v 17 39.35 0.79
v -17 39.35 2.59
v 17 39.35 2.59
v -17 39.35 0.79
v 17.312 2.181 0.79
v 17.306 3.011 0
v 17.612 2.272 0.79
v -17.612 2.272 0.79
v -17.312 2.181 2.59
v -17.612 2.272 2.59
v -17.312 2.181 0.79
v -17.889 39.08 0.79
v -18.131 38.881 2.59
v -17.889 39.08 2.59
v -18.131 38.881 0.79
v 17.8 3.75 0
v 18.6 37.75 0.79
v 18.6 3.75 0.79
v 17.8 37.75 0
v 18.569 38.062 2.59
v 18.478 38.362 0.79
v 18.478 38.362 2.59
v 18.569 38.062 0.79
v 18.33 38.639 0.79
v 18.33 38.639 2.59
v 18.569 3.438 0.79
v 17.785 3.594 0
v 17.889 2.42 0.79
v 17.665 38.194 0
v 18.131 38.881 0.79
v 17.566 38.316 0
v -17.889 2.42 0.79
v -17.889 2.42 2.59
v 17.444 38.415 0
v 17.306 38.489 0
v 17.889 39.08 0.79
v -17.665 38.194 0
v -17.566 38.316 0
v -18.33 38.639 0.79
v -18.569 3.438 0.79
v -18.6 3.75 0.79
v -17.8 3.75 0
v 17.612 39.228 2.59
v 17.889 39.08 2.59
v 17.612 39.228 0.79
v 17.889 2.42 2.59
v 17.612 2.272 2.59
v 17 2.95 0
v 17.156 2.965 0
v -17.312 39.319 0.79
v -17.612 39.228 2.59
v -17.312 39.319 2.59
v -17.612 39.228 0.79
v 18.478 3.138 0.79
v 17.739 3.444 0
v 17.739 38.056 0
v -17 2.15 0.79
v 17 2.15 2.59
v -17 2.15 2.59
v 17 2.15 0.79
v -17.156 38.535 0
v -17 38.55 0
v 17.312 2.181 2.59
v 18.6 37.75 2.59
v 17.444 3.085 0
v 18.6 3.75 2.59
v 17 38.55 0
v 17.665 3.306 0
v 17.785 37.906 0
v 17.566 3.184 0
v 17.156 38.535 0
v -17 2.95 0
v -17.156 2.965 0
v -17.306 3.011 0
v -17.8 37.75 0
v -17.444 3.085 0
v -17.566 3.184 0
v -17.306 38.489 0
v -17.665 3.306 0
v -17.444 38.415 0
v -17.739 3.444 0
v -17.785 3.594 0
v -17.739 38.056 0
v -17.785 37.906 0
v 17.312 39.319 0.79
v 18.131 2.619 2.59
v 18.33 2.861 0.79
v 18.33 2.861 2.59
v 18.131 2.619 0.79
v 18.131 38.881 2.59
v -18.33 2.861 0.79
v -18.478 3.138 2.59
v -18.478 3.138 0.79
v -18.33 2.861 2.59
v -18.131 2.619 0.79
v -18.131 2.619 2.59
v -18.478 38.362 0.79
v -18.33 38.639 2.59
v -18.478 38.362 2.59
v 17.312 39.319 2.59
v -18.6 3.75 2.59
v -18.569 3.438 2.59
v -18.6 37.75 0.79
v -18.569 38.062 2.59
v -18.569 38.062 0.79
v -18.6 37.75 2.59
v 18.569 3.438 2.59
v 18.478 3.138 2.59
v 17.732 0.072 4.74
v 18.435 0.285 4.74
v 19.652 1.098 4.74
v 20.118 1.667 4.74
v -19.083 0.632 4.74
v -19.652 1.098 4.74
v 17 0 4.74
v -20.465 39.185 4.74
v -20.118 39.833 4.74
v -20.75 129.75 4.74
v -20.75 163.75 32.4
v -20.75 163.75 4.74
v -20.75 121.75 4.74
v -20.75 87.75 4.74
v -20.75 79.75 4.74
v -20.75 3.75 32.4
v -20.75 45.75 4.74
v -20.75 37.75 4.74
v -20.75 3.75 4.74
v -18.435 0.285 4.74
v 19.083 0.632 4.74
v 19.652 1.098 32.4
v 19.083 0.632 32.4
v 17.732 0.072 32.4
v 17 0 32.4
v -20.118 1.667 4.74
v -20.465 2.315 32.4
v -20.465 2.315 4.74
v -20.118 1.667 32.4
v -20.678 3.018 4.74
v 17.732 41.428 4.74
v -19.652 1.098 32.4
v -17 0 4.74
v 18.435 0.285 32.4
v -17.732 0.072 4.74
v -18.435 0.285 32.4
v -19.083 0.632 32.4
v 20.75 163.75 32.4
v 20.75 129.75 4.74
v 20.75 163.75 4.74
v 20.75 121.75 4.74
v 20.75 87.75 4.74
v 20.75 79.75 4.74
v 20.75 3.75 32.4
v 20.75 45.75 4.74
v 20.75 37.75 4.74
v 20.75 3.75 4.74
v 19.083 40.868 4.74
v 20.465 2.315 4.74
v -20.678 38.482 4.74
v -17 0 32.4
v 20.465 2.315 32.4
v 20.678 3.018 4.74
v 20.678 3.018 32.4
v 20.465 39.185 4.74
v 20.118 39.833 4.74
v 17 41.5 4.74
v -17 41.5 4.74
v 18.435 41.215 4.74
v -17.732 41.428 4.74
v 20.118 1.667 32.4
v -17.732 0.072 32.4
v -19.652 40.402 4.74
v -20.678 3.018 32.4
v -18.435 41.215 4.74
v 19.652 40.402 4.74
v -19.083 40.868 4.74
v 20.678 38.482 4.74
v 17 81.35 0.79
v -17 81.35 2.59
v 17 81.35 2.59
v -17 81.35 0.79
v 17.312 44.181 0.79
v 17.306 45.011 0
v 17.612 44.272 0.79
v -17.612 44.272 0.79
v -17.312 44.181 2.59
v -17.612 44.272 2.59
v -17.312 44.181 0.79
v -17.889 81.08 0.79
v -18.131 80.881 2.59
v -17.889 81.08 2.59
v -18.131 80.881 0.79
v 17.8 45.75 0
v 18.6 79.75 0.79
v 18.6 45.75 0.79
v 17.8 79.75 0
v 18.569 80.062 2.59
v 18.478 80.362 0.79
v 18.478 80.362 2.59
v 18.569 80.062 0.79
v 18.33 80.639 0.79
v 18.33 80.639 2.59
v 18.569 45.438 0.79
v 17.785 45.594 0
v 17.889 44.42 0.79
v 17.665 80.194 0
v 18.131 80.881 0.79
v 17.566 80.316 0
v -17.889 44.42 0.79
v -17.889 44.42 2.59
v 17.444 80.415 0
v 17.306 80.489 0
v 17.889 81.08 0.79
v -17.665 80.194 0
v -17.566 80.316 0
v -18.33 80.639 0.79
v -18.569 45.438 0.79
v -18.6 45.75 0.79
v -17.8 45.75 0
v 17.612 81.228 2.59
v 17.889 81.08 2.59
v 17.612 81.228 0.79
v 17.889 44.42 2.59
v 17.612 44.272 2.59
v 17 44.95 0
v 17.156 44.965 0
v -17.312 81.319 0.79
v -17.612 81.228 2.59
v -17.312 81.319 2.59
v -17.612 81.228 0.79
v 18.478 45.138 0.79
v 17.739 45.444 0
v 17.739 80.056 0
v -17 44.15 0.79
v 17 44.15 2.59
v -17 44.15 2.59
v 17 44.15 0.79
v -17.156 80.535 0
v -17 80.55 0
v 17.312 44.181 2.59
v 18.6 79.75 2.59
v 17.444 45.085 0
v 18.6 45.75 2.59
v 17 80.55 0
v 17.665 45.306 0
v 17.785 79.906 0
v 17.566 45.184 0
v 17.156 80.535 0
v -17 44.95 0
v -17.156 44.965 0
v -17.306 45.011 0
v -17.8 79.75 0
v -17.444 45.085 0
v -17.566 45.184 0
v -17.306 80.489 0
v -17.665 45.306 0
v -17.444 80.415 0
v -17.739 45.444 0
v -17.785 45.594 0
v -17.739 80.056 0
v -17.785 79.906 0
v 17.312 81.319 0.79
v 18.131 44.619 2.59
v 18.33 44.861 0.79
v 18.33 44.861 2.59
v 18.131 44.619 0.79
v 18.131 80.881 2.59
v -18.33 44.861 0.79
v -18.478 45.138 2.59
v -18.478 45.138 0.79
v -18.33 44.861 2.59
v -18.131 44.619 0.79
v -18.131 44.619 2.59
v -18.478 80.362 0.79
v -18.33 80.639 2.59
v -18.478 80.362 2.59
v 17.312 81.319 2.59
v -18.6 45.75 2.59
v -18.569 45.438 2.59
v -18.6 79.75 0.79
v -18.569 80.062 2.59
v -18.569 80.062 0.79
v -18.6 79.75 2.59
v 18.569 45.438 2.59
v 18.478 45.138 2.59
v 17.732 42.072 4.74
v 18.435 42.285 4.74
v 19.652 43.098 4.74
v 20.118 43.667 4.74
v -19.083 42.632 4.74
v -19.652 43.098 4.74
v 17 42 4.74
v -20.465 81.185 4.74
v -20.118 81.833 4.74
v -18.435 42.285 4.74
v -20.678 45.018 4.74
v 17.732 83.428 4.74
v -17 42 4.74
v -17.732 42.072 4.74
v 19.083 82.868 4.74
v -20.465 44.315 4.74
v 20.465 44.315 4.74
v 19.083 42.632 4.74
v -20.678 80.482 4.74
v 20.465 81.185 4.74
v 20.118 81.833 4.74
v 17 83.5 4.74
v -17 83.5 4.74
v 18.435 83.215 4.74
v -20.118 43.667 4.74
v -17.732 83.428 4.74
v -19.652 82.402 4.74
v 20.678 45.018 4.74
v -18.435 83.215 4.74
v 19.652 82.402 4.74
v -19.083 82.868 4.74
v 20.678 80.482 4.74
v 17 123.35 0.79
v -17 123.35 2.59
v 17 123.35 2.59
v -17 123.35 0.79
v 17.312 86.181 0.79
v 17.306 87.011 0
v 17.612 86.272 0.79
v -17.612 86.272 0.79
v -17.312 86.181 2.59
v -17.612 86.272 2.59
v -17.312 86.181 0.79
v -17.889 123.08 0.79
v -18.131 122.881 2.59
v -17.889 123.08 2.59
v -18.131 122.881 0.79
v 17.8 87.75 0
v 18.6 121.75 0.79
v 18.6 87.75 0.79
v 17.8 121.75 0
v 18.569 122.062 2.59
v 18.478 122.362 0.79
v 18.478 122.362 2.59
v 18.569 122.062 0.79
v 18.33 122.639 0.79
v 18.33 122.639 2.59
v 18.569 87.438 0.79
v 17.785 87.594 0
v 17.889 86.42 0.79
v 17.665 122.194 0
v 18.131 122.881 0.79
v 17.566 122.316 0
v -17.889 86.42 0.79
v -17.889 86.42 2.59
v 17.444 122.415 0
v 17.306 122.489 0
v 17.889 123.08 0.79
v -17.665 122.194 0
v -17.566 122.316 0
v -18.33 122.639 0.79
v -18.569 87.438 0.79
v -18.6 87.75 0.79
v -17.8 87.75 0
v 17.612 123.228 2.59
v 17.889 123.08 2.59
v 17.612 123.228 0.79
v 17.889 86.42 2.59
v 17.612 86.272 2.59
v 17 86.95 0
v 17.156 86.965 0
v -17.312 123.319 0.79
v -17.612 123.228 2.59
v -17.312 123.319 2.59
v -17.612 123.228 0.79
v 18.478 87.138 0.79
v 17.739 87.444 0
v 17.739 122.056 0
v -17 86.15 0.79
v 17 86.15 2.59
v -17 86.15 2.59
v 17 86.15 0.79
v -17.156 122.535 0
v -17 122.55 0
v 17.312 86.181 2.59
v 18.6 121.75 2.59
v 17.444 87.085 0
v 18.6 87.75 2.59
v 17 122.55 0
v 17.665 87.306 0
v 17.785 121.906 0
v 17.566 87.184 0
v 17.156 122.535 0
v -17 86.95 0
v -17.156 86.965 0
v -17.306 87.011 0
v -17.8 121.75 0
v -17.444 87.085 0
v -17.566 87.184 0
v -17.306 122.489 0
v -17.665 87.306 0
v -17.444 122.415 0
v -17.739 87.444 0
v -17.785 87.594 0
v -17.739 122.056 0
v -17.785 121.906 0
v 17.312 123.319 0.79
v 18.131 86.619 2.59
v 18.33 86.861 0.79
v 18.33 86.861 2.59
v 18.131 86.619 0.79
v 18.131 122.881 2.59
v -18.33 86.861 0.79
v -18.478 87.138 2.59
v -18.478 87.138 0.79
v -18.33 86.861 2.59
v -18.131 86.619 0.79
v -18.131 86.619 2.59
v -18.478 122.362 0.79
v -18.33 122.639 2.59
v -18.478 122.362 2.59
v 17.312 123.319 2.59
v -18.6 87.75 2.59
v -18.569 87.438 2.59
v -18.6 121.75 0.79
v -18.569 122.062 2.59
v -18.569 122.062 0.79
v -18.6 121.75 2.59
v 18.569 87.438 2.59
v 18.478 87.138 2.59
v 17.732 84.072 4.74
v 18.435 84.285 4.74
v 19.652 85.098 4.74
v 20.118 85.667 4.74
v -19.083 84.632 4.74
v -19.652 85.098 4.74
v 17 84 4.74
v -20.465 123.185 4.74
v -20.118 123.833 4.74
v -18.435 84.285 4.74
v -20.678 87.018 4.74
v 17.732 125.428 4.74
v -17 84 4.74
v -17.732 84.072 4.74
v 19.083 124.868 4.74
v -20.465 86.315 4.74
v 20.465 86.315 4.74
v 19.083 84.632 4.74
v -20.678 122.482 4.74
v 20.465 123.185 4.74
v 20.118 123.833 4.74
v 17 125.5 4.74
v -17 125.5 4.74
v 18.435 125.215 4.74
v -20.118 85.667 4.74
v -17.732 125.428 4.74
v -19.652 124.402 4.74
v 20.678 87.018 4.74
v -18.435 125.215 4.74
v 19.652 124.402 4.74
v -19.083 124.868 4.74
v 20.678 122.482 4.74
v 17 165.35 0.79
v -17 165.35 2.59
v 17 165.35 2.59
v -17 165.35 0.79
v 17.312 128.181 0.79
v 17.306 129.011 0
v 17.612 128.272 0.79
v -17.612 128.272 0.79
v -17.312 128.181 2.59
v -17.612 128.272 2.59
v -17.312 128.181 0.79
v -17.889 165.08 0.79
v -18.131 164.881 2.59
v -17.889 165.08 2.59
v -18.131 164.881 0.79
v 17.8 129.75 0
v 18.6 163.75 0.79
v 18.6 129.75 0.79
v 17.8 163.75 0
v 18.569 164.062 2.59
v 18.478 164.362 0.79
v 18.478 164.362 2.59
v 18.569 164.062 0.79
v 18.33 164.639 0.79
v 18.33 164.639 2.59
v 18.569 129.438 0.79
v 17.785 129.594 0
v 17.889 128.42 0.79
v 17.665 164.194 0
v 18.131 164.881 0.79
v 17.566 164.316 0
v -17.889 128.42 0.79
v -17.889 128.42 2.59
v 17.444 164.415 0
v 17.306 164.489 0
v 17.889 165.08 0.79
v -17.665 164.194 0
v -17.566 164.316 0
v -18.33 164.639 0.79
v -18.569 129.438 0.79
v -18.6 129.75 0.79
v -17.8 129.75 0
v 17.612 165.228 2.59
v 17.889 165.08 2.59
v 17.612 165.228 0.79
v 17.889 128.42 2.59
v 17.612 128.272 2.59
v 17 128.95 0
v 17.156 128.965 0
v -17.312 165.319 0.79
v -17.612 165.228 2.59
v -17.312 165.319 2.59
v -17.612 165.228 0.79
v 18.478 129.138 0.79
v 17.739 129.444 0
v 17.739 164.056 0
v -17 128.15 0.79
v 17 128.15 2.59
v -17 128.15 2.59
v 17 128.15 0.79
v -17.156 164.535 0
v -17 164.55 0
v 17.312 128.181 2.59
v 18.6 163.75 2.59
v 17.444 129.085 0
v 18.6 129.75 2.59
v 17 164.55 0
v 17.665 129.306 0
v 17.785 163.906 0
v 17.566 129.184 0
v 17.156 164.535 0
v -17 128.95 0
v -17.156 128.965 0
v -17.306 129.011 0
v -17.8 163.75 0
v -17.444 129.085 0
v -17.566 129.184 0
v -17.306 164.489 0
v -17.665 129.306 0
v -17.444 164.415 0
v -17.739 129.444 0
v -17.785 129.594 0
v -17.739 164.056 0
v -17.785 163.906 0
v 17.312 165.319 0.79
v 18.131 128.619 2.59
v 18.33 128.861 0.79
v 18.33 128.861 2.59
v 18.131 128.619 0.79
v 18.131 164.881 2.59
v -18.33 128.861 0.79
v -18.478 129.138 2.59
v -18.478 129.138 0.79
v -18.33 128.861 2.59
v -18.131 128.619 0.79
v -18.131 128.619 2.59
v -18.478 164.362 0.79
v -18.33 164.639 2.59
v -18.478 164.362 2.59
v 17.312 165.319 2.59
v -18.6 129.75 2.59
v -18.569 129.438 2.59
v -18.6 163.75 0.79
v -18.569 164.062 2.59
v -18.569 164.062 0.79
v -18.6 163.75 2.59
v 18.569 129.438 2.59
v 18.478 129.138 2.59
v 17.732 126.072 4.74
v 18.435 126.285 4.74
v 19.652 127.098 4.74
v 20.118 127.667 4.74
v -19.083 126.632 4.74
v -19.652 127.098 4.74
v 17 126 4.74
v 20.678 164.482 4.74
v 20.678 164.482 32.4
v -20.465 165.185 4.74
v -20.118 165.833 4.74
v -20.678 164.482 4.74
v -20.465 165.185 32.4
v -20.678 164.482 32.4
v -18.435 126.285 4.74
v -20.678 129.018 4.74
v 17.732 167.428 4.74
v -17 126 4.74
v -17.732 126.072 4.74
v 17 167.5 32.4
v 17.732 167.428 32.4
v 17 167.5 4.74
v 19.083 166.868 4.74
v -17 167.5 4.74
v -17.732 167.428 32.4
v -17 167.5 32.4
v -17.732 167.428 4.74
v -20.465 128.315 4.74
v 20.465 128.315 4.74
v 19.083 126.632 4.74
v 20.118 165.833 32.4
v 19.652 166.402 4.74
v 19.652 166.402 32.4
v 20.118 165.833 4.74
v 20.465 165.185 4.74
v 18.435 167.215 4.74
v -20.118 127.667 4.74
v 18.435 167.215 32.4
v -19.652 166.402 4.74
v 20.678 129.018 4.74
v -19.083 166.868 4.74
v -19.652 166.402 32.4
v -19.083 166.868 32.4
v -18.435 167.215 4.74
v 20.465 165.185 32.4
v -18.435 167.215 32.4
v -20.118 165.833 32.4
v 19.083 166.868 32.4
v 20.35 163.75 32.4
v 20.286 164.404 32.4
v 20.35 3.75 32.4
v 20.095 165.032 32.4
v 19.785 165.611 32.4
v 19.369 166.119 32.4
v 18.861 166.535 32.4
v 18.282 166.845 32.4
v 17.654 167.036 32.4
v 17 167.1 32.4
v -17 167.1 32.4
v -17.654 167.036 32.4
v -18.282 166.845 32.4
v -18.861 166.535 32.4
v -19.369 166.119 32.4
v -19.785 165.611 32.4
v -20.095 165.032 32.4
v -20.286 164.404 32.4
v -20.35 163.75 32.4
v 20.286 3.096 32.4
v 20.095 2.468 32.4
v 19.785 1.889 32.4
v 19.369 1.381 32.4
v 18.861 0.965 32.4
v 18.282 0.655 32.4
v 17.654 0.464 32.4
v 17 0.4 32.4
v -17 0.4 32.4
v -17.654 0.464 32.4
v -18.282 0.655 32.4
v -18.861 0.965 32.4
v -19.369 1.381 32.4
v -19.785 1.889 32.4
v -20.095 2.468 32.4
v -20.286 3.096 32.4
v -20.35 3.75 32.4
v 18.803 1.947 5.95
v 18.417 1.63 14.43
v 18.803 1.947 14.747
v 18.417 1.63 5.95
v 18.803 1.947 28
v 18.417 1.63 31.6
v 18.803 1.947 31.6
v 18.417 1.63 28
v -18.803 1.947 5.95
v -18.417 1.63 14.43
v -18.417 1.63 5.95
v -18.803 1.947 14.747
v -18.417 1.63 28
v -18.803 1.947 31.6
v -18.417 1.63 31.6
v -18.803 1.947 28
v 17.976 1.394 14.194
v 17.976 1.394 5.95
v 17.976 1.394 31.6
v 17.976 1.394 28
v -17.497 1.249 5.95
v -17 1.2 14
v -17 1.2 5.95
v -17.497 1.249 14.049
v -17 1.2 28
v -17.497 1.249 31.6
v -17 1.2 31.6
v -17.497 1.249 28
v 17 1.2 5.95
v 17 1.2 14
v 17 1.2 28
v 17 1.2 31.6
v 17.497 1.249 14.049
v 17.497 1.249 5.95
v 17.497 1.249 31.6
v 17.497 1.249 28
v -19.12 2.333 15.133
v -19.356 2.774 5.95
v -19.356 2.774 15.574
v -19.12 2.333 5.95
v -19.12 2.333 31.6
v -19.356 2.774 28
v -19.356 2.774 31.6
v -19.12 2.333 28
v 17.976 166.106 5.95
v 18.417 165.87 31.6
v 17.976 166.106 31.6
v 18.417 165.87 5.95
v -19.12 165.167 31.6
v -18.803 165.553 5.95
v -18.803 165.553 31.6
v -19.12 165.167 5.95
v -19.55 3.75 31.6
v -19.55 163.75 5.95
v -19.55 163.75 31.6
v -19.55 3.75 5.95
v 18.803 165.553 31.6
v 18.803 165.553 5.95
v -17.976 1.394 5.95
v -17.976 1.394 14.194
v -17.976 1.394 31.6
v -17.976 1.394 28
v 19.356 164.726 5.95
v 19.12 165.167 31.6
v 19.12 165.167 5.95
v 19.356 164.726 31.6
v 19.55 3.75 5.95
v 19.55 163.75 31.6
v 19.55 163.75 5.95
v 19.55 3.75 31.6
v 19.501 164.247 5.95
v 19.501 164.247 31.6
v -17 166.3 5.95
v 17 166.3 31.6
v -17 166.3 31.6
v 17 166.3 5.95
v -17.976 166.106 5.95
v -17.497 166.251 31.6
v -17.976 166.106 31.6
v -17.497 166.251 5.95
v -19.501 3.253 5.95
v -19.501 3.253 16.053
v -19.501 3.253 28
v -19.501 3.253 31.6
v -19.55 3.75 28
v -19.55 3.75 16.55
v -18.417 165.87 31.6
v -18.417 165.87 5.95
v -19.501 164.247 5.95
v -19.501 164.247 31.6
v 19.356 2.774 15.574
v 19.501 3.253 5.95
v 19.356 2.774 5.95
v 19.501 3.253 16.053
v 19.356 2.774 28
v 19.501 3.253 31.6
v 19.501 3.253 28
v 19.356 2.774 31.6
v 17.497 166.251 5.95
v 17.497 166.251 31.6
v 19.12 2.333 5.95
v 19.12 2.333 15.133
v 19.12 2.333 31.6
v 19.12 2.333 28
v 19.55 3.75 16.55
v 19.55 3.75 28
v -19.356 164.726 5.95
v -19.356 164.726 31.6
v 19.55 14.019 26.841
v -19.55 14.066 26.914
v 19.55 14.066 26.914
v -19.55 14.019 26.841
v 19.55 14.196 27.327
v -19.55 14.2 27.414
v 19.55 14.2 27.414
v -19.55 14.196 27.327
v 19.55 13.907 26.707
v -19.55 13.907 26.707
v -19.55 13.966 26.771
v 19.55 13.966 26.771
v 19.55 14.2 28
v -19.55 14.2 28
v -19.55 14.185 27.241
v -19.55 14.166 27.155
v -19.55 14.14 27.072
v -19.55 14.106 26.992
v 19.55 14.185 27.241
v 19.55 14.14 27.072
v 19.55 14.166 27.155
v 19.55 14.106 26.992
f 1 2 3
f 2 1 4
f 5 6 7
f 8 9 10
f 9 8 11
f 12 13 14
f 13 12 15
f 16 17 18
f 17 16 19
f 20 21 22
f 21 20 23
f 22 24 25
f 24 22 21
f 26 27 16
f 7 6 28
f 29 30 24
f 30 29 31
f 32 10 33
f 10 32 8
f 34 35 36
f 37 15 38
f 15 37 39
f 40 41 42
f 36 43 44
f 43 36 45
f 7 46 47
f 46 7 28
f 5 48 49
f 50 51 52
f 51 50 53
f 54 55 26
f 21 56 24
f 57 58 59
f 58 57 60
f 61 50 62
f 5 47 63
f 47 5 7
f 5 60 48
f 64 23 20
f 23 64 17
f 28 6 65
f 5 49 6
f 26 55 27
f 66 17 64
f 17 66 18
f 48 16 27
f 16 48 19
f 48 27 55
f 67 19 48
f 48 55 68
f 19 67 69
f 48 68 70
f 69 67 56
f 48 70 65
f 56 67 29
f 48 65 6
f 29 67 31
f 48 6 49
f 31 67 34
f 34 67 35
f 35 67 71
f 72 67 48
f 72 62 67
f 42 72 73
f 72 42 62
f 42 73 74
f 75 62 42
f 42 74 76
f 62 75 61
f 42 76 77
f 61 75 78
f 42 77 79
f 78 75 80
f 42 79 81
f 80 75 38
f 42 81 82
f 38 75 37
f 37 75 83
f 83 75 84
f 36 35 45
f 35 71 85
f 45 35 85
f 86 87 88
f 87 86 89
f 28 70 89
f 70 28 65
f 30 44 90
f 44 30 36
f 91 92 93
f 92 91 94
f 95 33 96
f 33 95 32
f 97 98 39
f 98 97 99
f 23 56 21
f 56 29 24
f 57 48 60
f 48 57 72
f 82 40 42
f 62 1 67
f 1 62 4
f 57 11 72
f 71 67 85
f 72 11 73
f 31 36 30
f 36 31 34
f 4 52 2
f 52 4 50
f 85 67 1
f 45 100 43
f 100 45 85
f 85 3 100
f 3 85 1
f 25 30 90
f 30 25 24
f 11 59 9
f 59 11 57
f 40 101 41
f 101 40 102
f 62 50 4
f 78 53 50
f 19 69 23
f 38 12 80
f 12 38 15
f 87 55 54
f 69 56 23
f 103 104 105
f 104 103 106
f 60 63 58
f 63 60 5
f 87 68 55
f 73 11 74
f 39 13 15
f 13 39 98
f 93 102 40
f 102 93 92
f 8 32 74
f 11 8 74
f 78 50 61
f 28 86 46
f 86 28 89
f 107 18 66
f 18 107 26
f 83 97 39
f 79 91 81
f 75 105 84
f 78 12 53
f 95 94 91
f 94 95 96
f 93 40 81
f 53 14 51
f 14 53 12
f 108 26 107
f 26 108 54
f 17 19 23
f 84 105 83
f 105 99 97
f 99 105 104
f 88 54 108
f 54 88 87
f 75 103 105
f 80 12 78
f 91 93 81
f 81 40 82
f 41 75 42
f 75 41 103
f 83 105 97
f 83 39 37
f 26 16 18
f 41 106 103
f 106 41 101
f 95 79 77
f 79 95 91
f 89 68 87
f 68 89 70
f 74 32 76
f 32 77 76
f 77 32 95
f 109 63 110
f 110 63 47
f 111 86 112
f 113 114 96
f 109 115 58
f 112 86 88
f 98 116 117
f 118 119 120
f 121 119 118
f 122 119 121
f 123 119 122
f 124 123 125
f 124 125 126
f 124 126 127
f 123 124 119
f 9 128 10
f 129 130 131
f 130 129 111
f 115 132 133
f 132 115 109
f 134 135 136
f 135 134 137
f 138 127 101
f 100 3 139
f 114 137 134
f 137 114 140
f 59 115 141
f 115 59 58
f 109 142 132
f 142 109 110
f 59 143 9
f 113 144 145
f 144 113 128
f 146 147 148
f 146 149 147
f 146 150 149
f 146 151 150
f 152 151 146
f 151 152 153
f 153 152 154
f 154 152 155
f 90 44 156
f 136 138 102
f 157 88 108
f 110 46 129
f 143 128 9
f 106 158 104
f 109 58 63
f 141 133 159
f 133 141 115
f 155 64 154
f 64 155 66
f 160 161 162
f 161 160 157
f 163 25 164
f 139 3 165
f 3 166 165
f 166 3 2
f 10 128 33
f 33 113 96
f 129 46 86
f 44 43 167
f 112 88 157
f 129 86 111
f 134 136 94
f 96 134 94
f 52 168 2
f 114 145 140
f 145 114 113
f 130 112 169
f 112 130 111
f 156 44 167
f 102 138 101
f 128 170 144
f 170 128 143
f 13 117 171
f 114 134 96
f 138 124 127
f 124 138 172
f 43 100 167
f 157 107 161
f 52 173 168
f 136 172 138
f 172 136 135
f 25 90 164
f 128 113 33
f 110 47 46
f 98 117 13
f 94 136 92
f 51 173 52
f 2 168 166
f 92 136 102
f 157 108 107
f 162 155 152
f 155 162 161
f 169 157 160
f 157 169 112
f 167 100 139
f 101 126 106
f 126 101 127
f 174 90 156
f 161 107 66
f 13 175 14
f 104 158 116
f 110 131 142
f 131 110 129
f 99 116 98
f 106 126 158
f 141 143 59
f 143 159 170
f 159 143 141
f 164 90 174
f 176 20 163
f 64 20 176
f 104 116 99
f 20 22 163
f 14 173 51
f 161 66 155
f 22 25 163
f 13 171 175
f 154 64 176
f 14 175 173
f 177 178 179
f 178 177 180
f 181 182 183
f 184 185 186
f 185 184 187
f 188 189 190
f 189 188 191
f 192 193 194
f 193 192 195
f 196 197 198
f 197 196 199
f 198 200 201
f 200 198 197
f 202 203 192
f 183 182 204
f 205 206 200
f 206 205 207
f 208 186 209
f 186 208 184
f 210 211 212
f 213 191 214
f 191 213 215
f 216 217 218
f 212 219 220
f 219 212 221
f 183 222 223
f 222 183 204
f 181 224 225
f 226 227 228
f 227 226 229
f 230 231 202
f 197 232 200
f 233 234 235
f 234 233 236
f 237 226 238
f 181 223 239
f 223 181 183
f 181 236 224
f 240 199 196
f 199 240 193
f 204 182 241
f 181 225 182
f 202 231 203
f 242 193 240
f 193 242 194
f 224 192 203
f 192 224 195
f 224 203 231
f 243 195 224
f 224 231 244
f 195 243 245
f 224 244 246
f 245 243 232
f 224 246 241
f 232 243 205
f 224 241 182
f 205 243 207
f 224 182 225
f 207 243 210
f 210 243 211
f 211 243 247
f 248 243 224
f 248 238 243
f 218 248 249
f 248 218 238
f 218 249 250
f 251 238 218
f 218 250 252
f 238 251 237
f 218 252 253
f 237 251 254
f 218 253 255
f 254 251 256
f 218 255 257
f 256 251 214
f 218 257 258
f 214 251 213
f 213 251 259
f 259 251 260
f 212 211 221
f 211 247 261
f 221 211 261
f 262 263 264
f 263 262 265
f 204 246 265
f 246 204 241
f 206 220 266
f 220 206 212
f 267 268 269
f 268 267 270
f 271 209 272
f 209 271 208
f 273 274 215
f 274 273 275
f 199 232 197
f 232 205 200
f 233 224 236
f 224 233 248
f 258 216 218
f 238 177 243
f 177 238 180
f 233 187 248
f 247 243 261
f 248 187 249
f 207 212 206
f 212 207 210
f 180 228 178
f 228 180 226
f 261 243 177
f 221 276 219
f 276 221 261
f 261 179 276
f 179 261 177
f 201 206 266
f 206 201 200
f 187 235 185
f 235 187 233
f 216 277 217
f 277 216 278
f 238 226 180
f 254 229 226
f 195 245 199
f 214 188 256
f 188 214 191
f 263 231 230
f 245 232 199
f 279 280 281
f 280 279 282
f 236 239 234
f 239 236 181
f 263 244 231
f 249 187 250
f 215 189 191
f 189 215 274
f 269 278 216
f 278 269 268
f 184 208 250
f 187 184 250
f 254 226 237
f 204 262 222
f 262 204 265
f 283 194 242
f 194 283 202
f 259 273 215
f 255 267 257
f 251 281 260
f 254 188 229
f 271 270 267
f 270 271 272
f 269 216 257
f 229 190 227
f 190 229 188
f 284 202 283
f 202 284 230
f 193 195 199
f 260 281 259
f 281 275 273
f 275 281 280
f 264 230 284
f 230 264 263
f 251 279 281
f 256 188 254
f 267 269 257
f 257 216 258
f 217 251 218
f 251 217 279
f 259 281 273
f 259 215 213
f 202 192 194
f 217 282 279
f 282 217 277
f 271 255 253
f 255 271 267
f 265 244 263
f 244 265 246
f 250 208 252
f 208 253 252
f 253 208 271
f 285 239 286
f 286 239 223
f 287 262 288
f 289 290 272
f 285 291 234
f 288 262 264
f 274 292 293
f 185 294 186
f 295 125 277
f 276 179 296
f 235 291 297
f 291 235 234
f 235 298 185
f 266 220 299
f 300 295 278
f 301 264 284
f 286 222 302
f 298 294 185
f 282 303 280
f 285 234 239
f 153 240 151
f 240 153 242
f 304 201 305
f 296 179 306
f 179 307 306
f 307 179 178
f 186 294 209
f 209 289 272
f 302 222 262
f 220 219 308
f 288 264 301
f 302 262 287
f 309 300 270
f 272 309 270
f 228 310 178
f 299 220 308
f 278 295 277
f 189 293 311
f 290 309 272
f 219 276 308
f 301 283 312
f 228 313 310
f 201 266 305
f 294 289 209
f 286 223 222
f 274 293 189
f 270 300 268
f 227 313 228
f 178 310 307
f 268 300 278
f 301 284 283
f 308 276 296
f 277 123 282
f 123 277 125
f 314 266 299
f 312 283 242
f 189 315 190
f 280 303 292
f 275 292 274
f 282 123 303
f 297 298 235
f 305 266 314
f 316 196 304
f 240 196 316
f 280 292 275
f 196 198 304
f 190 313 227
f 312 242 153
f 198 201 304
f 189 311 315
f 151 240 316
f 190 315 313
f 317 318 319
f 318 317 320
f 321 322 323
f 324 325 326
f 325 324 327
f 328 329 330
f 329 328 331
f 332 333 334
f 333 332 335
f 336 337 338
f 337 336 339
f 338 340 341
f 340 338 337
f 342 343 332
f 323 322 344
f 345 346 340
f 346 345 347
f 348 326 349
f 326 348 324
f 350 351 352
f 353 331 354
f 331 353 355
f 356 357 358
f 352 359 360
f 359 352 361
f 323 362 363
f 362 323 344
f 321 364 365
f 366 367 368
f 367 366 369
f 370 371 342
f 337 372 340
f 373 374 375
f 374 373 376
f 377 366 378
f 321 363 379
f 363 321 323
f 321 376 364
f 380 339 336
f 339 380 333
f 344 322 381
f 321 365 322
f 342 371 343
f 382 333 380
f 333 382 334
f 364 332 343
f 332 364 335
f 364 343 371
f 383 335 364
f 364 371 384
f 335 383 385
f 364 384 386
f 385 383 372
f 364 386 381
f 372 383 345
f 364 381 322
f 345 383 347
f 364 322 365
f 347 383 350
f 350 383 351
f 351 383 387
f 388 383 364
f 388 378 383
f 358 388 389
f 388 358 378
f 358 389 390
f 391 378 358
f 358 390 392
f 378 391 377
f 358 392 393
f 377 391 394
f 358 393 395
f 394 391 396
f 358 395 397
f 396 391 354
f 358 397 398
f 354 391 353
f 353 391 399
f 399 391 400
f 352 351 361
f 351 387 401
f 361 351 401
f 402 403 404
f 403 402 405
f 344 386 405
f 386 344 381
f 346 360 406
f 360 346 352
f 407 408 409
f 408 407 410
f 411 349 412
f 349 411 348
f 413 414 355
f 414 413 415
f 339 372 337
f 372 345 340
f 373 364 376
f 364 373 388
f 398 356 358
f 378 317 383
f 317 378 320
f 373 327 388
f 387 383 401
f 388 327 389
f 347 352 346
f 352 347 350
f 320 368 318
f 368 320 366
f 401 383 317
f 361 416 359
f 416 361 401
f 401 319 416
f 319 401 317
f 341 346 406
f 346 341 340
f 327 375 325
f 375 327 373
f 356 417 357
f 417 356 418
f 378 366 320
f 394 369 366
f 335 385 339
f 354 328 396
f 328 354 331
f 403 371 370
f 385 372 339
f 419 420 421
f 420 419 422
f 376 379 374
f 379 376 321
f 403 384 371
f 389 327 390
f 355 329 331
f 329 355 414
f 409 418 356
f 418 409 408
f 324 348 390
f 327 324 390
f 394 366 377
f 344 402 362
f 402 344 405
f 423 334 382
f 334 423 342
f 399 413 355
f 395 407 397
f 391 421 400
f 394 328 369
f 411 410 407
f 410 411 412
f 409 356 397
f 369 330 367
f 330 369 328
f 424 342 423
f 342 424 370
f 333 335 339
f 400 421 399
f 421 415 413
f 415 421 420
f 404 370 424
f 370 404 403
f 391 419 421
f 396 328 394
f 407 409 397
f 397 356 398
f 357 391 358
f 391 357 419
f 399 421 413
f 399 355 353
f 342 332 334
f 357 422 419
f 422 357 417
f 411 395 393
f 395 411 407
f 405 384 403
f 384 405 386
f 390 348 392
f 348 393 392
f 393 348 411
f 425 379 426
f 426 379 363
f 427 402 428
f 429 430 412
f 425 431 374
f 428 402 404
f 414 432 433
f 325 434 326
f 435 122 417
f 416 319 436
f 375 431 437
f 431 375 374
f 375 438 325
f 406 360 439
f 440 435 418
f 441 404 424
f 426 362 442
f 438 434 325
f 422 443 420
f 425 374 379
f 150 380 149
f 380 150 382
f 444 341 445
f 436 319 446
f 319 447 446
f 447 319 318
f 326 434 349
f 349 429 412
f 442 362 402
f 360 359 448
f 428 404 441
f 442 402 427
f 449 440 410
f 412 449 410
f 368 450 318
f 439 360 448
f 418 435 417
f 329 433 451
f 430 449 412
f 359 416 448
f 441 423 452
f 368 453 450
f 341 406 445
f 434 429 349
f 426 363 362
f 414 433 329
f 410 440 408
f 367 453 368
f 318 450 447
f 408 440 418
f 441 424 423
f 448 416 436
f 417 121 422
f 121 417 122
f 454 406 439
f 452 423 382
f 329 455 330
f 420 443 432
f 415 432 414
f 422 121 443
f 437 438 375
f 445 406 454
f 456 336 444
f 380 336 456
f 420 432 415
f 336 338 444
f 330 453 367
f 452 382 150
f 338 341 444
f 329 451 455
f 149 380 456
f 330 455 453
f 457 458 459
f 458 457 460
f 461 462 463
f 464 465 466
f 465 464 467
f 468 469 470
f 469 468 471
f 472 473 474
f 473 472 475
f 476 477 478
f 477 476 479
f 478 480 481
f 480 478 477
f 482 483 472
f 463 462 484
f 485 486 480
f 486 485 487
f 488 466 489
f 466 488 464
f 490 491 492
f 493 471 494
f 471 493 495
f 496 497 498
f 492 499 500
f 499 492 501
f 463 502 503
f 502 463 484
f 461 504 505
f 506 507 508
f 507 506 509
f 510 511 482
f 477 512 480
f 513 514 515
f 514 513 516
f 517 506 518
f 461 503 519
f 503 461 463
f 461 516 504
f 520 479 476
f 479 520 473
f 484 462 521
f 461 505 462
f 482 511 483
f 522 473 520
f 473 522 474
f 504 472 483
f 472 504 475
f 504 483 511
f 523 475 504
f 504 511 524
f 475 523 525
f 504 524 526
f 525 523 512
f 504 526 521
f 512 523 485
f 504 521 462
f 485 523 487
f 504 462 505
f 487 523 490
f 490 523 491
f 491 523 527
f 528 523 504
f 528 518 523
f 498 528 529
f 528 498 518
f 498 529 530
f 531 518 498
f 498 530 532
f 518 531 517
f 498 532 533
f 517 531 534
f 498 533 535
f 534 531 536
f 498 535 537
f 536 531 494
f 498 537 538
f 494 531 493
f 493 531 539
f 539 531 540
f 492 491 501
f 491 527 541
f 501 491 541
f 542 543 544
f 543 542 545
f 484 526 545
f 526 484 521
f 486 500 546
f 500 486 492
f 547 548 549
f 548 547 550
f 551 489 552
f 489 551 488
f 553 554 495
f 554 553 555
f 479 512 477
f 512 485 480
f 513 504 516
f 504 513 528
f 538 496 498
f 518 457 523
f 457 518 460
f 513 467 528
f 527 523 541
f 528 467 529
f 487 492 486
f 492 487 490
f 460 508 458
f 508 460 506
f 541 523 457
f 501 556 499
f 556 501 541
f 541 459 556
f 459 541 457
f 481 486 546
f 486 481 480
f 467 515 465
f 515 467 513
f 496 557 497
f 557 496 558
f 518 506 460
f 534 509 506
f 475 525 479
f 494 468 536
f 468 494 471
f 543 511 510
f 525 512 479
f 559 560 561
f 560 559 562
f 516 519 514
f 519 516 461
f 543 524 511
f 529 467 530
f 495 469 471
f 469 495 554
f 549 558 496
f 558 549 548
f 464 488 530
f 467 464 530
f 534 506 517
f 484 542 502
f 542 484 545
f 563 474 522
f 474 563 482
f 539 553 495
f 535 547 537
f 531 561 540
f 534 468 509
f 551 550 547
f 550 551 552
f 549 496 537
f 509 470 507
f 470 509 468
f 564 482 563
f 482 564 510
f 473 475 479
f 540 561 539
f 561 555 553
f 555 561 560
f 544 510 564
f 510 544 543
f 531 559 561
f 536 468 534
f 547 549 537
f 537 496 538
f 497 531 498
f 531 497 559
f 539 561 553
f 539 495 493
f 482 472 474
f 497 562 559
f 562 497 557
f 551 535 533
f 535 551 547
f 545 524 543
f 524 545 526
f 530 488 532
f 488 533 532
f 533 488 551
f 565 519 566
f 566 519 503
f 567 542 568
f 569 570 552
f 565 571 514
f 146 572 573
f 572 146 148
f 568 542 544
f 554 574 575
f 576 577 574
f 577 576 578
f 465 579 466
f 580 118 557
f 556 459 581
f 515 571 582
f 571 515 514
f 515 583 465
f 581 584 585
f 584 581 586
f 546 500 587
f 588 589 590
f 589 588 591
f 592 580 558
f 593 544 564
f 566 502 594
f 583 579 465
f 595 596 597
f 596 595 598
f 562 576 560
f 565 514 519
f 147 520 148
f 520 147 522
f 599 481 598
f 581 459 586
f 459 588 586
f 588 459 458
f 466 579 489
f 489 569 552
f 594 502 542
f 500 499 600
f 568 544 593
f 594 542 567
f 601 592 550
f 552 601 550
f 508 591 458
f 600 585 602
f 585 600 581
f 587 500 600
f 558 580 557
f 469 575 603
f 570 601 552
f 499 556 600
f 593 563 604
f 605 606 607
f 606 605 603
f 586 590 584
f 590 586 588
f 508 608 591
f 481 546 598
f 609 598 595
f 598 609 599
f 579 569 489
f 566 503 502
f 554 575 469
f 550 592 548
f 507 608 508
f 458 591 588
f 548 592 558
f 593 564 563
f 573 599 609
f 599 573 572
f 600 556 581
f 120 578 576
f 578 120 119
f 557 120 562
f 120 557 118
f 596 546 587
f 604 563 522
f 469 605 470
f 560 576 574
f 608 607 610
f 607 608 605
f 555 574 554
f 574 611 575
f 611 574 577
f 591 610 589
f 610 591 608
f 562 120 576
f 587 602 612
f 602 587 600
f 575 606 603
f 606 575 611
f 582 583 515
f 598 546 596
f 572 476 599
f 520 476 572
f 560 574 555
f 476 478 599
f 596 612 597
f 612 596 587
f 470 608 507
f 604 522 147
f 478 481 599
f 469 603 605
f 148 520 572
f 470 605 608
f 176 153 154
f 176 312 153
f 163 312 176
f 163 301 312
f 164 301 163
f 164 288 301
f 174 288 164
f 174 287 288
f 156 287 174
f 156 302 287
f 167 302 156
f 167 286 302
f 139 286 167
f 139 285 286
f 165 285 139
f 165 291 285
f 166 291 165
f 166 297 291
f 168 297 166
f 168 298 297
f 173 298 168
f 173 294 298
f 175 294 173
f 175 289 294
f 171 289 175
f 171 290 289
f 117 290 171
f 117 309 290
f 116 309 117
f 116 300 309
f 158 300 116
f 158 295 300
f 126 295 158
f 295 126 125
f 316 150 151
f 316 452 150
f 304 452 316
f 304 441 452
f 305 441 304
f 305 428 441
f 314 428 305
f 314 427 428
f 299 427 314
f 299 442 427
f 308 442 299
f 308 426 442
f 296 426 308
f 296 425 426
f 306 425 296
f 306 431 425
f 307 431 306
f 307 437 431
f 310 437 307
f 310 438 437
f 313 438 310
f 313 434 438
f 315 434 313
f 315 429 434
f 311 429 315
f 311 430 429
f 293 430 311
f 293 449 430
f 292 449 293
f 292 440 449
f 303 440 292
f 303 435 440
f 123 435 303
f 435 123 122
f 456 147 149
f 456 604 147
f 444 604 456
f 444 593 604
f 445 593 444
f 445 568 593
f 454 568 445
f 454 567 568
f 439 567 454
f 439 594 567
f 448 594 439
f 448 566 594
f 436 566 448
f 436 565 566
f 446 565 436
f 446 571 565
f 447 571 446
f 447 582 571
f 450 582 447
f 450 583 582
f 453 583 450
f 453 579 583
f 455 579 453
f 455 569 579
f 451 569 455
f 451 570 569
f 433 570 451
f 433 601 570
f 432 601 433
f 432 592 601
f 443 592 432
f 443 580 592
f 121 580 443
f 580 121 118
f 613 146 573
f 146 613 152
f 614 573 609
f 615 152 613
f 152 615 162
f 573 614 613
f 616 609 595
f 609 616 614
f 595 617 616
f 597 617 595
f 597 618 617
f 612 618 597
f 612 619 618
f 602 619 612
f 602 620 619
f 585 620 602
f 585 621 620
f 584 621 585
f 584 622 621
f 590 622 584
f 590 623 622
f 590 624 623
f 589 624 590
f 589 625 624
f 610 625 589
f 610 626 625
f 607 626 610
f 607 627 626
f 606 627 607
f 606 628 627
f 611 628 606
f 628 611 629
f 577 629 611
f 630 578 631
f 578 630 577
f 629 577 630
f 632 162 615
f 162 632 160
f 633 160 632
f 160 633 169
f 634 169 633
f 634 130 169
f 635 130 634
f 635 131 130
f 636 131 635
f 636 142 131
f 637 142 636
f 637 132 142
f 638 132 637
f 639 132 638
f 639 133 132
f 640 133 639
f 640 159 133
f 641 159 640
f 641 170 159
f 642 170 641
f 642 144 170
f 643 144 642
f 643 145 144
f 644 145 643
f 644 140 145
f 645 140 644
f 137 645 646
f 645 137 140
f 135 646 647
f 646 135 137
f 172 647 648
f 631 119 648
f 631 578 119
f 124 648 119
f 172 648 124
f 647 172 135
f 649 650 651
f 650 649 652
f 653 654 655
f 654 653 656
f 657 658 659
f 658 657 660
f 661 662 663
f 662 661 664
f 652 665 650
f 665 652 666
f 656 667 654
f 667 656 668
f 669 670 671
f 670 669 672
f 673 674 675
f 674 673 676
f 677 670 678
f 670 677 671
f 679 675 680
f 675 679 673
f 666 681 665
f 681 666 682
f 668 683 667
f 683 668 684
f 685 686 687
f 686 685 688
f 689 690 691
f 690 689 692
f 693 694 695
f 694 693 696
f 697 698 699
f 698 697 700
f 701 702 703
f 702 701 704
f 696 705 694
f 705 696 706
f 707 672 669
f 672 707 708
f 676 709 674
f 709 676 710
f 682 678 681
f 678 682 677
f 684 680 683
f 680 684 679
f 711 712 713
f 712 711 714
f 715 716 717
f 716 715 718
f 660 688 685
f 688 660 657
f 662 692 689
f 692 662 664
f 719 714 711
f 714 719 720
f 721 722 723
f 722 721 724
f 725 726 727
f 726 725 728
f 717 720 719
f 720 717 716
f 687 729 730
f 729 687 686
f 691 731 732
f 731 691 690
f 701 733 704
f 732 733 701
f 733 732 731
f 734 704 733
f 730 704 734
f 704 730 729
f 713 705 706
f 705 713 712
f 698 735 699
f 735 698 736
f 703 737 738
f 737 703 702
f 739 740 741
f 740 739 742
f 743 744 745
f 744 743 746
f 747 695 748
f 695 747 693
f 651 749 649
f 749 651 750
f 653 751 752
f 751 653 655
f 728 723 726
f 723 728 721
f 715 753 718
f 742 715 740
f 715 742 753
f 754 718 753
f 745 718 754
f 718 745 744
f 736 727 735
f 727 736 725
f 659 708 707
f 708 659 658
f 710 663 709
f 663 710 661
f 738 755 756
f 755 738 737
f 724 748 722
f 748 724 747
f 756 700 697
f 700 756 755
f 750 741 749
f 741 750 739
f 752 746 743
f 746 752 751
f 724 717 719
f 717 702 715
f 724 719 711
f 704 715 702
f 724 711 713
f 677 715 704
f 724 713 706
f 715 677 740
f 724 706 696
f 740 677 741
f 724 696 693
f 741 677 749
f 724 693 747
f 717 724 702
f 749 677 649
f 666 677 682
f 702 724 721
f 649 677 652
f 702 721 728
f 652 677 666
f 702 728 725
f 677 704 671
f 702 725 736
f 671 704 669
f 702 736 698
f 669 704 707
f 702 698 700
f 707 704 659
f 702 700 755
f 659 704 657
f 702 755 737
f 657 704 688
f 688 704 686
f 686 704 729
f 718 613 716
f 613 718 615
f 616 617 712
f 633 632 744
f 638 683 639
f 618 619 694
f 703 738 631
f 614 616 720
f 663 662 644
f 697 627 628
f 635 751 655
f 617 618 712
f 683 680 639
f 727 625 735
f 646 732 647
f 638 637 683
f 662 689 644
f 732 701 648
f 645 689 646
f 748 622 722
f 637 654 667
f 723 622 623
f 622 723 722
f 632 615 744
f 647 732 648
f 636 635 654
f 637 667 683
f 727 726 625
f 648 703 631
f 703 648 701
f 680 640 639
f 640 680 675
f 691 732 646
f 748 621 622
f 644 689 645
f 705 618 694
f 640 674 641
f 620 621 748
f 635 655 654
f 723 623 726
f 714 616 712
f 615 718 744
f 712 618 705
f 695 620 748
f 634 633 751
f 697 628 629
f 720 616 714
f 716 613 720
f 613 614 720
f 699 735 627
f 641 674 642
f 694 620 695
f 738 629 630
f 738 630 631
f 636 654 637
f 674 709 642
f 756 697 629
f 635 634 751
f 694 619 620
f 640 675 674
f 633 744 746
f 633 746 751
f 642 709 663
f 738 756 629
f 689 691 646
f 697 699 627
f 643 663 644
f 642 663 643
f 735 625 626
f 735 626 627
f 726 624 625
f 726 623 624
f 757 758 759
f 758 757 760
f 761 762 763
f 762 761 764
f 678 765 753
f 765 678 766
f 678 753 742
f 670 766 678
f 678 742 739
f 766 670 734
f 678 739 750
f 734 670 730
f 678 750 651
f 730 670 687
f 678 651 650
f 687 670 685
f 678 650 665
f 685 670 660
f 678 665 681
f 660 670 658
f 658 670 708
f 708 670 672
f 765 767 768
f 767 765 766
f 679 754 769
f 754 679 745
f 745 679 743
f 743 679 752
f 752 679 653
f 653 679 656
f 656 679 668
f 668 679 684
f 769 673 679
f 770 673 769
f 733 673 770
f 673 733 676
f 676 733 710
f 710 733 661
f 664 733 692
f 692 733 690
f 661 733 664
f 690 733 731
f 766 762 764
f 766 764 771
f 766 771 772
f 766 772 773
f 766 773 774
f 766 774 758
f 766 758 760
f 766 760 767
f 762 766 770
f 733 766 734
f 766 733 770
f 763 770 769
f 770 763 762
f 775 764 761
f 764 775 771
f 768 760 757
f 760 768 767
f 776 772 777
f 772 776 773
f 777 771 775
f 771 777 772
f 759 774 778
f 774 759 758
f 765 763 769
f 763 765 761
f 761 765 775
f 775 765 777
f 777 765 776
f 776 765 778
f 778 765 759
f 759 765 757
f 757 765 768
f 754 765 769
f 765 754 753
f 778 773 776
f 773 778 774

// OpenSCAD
// file: ../../../modules/gridfinity.scad
// Gridfinity ベースプレートの共有 module。
// 寸法は Gridfinity 仕様 (Zack Freedman) の baseplate 輪郭に従う:
//   ピッチ 42、ソケット上端開口 41.5 (角 R4)、上から 45° 面取り 2.15 →
//   垂直 1.8 (37.2 角・R1.85) → 45° 面取り 0.7 → 底 35.8 角 (R1.15)。
//   ソケット深さ = 2.15 + 1.8 + 0.7 = 4.65。
//
// 座標系: X が列方向 (中央が 0)、Y が行方向 (板の前端が 0)、Z=0 が板の底面。
// 板の外形は grid とは独立に rim で与えるので、grid より大きい板 (縁付き) を
// 作れる。ソケットは rim=[left, right, front, back] の内側へ 42 ピッチで並ぶ。

gf_pitch = 42;
gf_socket_top = 41.5; // 上端開口
gf_socket_mid = 37.2; // 垂直部
gf_socket_bot = 35.8; // 底
gf_socket_r_top = 4;
gf_socket_r_mid = 1.85;
gf_socket_r_bot = 1.15;
gf_chamfer_top = 2.15;
gf_wall_h = 1.8;
gf_chamfer_bot = 0.7;
gf_socket_depth = gf_chamfer_top + gf_wall_h + gf_chamfer_bot; // 4.65
gf_fn = 32;
gf_eps = 0.01; // hull 用の薄板の厚さ
gf_over = 0.5; // 切削の抜き代

// 角丸正方形または矩形 (w は一辺、または [幅, 奥行き]、角 R)
module
gf_rounded_square(w, r)
{
    offset(r = r, $fn = gf_fn)
        square(is_list(w) ? w - [ 2 * r, 2 * r ] : w - 2 * r, center = true);
}

// 厚さ gf_eps の角丸正方形の薄板を z に置く (hull の骨)
module
gf_slab(w, r, z)
{
    translate([ 0, 0, z ]) linear_extrude(gf_eps) gf_rounded_square(w, r);
}

// ソケット1個の切削体。z=0 がソケットの底 (床の天面)、+Z へ 4.65 で天面に出る。
// clearance は嵌合の逃げで、輪郭を全周へ clearance だけ外へ出す (幅 +2c、角 R
// +c)。pitch_x は X 方向のセル幅。端数でも角 R と面取りの寸法を保つ。
module
gf_socket_cut(clearance = 0, pitch_x = gf_pitch)
{
    z1 = gf_chamfer_bot;
    z2 = z1 + gf_wall_h;
    z3 = gf_socket_depth;
    c = clearance;
    assert(pitch_x > gf_pitch - gf_socket_top + 2 * gf_socket_r_top,
           "Cell width is too small for the socket corner radius");
    delta = [ pitch_x - gf_pitch, 0 ];
    bot = [ gf_socket_bot + 2 * c, gf_socket_bot + 2 * c ] + delta;
    mid = [ gf_socket_mid + 2 * c, gf_socket_mid + 2 * c ] + delta;
    top = [ gf_socket_top + 2 * c, gf_socket_top + 2 * c ] + delta;
    hull()
    {
        gf_slab(bot, gf_socket_r_bot + c, 0);
        gf_slab(mid, gf_socket_r_mid + c, z1 - gf_eps);
    }
    hull()
    {
        gf_slab(mid, gf_socket_r_mid + c, z1 - gf_eps);
        gf_slab(mid, gf_socket_r_mid + c, z2 - gf_eps);
    }
    hull()
    {
        gf_slab(mid, gf_socket_r_mid + c, z2 - gf_eps);
        gf_slab(top, gf_socket_r_top + c, z3 - gf_eps);
    }
    // 天面より上へ抜く (天面と同一平面の退化した面を残さない)
    gf_slab(top, gf_socket_r_top + c, z3 - gf_eps);
    translate([ 0, 0, z3 - gf_eps ]) linear_extrude(gf_over + gf_eps)
        gf_rounded_square(top, gf_socket_r_top + c);
}

// ベースプレート。cols x rows のソケットを床 floor_t の上に彫る。
// rim = [left, right, front, back] はソケット列の外側に残す縁の幅。
// 板の幅 = cols*42 + left + right、奥行き = rows*42 + front + back。
// cols の端数は左端の細幅セルになる。rows は正の整数。
// clearance はソケットの嵌合の逃げ (gf_socket_cut を参照)。
module
gf_baseplate(cols, rows, rim = [ 0, 0, 0, 0 ], floor_t = 1, clearance = 0)
{
    grid_w = cols * gf_pitch;
    grid_d = rows * gf_pitch;
    plate_w = grid_w + rim[0] + rim[1];
    plate_d = grid_d + rim[2] + rim[3];
    x0 = -plate_w / 2 + rim[0]; // ソケット列の左端
    first_pitch = grid_w - (ceil(cols) - 1) * gf_pitch;
    difference()
    {
        translate([ -plate_w / 2, 0, 0 ])
            cube([ plate_w, plate_d, floor_t + gf_socket_depth ]);
        for (c = [0:ceil(cols) - 1], r = [0:rows - 1])
            translate([
                x0 + (c == 0 ? first_pitch / 2
                             : first_pitch + (c - 0.5) * gf_pitch),
                rim[2] + (r + 0.5) * gf_pitch,
                floor_t
            ]) gf_socket_cut(clearance, c == 0 ? first_pitch : gf_pitch);
    }
}
// file: ../../../modules/gridfinity_bins.scad
include <gridfinity_bin.scad>

// assets/gridfinity-bin/ の bin 群の共通値と、サイズ 3 引数の払い出し口。
// 単体では何も描かない。設計の経緯と確定値は
// ledger/designs/gridfinity-bin-4u.md が正本。
// 通常binは4U/9U、X={1,1.5,2,2.5,3} × Y={1,2,3,4,5,5.5}。
// 両軸に端数を持つ組み合わせはassetに置かない（各高さ28種）。
// Xが横、Yがラベルの壁から奥、unitsが高さ（7mm単位）。
wall = 1.2;    // 0.4 ノズル 3 本
floor_t = 1.2; // 底 (4.75) の上に載せる床。床の天面 z = 5.95
label_d = 13;  // 12mm 幅のラベルシールを貼る天板の張り出し
label_t = 1; // 天板の厚さ (user 指定)。下は 45° の無垢のくさび
label_r = 1; // 天板の先端と 45° 面の境目の R (user 指定)
// カードケース (goods/card_case_2x3x4u.scad) の値。カードは ISO/IEC 7810 ID-1 (85.6 × 54 ×
// 0.76、隅 R3) で、長辺を Y (rows 方向) に寝かせ、X 中央・手前の壁から 10 奥に置く。ポケットは
// カードより 1 大きい (片側 0.5)。右奥のマスは壁の内面まで抜き、床と底を外形に平行な 45° の窪みにする。
// ポケットの左右の埋めの天面 (幅 13.05) が 12mm のラベルを貼る帯。ポケットと穴の交点の
// 縦エッジは丸める (開口の上縁は丸めない: 壁を上端まで垂直に保ち、収まる枚数を減らさない)
card_w = 54;    // カードの短辺 (X)。user 指定「高さ 54」
card_d = 85.6;  // カードの長辺 (Y)。user 指定「幅 85.6」
card_clear = 1; // ポケットの余裕 (user 指定「+1mm」)
// ポケットの手前の辺の、手前の壁の内面からの距離 (user 指定「10mm」)
card_off = 10;
// ポケットの平面の隅 R (user 指定「角の丸み 3mm」。ID-1 の隅は 2.88..3.48)
card_r = 3;
// ポケットと穴が交わる所の、埋めの凸の縦エッジの R (指の当たる角)
card_edge_r = 2;
recess_skin = floor_t + 1.75; // 窪みの床 z (底の皮)。user 指定「壁厚と同じ 1.2 は過剰、1.75 返す」

function bin_contract(cols, rows, units) = str("CONTRACT units=",
                                               units,
                                               " pitch=",
                                               gf_pitch,
                                               " outer=",
                                               gfb_outer,
                                               " h=",
                                               units* gfb_unit,
                                               " lip=",
                                               gfb_lip_h,
                                               " base=",
                                               gfb_base_bot,
                                               "/",
                                               gfb_base_mid,
                                               "/",
                                               gfb_outer,
                                               " base_h=",
                                               gfb_base_h,
                                               " wall=",
                                               wall,
                                               " floor_top=",
                                               gfb_base_h + floor_t,
                                               " label=",
                                               label_d,
                                               "x",
                                               label_t,
                                               " wedge=45 fillet=",
                                               label_r,
                                               " bin=",
                                               cols,
                                               "x",
                                               rows,
                                               " size=",
                                               cols* gf_pitch - 0.5,
                                               "x",
                                               rows* gf_pitch - 0.5);

// (cols, rows, units) でラベル付き bin を払い出す。例: gridfinity_bin(2, 4, 4)
module
gridfinity_bin(cols, rows, units = 4)
{
    echo(bin_contract(cols, rows, units));
    gfb_bin(cols, rows, units, wall, floor_t, label_d, label_t, label_r);
}

function card_contract(cols, rows, units) = str("CONTRACT card units=",
                                                units,
                                                " bin=",
                                                cols,
                                                "x",
                                                rows,
                                                " size=",
                                                cols* gf_pitch - 0.5,
                                                "x",
                                                rows* gf_pitch - 0.5,
                                                " h=",
                                                units* gfb_unit,
                                                " lip=",
                                                gfb_lip_h,
                                                " floor_top=",
                                                gfb_base_h + floor_t,
                                                " card=",
                                                card_w,
                                                "x",
                                                card_d,
                                                " pocket=",
                                                card_w + card_clear,
                                                "x",
                                                card_d + card_clear,
                                                " at=",
                                                -(card_w + card_clear) / 2,
                                                ",",
                                                wall + card_off,
                                                " hole=",
                                                (cols - 1) / 2 * gf_pitch - gfb_outer / 2,
                                                ",",
                                                (rows - 0.5) * gf_pitch - 0.25 - gfb_outer / 2,
                                                " hole_r=",
                                                gfb_outer_r - wall,
                                                " recess=",
                                                gfb_outer - 2 * wall,
                                                "/",
                                                gfb_base_mid - 2 * wall,
                                                " recess_floor=",
                                                recess_skin,
                                                " r=",
                                                card_r,
                                                " edge_r=",
                                                card_edge_r);

// (cols, rows, units) でカードケースを払い出す。例: gridfinity_card_case(2, 3, 4)
module
gridfinity_card_case(cols, rows, units = 4)
{
    echo(card_contract(cols, rows, units));
    gfb_card_case(cols,
                  rows,
                  units,
                  wall,
                  floor_t,
                  [ card_w, card_d ],
                  card_clear,
                  card_off,
                  card_r,
                  recess_skin,
                  card_edge_r);
}
// main file
include <../../../modules/gridfinity_bins.scad>

gridfinity_bin(1, 4, 4);
